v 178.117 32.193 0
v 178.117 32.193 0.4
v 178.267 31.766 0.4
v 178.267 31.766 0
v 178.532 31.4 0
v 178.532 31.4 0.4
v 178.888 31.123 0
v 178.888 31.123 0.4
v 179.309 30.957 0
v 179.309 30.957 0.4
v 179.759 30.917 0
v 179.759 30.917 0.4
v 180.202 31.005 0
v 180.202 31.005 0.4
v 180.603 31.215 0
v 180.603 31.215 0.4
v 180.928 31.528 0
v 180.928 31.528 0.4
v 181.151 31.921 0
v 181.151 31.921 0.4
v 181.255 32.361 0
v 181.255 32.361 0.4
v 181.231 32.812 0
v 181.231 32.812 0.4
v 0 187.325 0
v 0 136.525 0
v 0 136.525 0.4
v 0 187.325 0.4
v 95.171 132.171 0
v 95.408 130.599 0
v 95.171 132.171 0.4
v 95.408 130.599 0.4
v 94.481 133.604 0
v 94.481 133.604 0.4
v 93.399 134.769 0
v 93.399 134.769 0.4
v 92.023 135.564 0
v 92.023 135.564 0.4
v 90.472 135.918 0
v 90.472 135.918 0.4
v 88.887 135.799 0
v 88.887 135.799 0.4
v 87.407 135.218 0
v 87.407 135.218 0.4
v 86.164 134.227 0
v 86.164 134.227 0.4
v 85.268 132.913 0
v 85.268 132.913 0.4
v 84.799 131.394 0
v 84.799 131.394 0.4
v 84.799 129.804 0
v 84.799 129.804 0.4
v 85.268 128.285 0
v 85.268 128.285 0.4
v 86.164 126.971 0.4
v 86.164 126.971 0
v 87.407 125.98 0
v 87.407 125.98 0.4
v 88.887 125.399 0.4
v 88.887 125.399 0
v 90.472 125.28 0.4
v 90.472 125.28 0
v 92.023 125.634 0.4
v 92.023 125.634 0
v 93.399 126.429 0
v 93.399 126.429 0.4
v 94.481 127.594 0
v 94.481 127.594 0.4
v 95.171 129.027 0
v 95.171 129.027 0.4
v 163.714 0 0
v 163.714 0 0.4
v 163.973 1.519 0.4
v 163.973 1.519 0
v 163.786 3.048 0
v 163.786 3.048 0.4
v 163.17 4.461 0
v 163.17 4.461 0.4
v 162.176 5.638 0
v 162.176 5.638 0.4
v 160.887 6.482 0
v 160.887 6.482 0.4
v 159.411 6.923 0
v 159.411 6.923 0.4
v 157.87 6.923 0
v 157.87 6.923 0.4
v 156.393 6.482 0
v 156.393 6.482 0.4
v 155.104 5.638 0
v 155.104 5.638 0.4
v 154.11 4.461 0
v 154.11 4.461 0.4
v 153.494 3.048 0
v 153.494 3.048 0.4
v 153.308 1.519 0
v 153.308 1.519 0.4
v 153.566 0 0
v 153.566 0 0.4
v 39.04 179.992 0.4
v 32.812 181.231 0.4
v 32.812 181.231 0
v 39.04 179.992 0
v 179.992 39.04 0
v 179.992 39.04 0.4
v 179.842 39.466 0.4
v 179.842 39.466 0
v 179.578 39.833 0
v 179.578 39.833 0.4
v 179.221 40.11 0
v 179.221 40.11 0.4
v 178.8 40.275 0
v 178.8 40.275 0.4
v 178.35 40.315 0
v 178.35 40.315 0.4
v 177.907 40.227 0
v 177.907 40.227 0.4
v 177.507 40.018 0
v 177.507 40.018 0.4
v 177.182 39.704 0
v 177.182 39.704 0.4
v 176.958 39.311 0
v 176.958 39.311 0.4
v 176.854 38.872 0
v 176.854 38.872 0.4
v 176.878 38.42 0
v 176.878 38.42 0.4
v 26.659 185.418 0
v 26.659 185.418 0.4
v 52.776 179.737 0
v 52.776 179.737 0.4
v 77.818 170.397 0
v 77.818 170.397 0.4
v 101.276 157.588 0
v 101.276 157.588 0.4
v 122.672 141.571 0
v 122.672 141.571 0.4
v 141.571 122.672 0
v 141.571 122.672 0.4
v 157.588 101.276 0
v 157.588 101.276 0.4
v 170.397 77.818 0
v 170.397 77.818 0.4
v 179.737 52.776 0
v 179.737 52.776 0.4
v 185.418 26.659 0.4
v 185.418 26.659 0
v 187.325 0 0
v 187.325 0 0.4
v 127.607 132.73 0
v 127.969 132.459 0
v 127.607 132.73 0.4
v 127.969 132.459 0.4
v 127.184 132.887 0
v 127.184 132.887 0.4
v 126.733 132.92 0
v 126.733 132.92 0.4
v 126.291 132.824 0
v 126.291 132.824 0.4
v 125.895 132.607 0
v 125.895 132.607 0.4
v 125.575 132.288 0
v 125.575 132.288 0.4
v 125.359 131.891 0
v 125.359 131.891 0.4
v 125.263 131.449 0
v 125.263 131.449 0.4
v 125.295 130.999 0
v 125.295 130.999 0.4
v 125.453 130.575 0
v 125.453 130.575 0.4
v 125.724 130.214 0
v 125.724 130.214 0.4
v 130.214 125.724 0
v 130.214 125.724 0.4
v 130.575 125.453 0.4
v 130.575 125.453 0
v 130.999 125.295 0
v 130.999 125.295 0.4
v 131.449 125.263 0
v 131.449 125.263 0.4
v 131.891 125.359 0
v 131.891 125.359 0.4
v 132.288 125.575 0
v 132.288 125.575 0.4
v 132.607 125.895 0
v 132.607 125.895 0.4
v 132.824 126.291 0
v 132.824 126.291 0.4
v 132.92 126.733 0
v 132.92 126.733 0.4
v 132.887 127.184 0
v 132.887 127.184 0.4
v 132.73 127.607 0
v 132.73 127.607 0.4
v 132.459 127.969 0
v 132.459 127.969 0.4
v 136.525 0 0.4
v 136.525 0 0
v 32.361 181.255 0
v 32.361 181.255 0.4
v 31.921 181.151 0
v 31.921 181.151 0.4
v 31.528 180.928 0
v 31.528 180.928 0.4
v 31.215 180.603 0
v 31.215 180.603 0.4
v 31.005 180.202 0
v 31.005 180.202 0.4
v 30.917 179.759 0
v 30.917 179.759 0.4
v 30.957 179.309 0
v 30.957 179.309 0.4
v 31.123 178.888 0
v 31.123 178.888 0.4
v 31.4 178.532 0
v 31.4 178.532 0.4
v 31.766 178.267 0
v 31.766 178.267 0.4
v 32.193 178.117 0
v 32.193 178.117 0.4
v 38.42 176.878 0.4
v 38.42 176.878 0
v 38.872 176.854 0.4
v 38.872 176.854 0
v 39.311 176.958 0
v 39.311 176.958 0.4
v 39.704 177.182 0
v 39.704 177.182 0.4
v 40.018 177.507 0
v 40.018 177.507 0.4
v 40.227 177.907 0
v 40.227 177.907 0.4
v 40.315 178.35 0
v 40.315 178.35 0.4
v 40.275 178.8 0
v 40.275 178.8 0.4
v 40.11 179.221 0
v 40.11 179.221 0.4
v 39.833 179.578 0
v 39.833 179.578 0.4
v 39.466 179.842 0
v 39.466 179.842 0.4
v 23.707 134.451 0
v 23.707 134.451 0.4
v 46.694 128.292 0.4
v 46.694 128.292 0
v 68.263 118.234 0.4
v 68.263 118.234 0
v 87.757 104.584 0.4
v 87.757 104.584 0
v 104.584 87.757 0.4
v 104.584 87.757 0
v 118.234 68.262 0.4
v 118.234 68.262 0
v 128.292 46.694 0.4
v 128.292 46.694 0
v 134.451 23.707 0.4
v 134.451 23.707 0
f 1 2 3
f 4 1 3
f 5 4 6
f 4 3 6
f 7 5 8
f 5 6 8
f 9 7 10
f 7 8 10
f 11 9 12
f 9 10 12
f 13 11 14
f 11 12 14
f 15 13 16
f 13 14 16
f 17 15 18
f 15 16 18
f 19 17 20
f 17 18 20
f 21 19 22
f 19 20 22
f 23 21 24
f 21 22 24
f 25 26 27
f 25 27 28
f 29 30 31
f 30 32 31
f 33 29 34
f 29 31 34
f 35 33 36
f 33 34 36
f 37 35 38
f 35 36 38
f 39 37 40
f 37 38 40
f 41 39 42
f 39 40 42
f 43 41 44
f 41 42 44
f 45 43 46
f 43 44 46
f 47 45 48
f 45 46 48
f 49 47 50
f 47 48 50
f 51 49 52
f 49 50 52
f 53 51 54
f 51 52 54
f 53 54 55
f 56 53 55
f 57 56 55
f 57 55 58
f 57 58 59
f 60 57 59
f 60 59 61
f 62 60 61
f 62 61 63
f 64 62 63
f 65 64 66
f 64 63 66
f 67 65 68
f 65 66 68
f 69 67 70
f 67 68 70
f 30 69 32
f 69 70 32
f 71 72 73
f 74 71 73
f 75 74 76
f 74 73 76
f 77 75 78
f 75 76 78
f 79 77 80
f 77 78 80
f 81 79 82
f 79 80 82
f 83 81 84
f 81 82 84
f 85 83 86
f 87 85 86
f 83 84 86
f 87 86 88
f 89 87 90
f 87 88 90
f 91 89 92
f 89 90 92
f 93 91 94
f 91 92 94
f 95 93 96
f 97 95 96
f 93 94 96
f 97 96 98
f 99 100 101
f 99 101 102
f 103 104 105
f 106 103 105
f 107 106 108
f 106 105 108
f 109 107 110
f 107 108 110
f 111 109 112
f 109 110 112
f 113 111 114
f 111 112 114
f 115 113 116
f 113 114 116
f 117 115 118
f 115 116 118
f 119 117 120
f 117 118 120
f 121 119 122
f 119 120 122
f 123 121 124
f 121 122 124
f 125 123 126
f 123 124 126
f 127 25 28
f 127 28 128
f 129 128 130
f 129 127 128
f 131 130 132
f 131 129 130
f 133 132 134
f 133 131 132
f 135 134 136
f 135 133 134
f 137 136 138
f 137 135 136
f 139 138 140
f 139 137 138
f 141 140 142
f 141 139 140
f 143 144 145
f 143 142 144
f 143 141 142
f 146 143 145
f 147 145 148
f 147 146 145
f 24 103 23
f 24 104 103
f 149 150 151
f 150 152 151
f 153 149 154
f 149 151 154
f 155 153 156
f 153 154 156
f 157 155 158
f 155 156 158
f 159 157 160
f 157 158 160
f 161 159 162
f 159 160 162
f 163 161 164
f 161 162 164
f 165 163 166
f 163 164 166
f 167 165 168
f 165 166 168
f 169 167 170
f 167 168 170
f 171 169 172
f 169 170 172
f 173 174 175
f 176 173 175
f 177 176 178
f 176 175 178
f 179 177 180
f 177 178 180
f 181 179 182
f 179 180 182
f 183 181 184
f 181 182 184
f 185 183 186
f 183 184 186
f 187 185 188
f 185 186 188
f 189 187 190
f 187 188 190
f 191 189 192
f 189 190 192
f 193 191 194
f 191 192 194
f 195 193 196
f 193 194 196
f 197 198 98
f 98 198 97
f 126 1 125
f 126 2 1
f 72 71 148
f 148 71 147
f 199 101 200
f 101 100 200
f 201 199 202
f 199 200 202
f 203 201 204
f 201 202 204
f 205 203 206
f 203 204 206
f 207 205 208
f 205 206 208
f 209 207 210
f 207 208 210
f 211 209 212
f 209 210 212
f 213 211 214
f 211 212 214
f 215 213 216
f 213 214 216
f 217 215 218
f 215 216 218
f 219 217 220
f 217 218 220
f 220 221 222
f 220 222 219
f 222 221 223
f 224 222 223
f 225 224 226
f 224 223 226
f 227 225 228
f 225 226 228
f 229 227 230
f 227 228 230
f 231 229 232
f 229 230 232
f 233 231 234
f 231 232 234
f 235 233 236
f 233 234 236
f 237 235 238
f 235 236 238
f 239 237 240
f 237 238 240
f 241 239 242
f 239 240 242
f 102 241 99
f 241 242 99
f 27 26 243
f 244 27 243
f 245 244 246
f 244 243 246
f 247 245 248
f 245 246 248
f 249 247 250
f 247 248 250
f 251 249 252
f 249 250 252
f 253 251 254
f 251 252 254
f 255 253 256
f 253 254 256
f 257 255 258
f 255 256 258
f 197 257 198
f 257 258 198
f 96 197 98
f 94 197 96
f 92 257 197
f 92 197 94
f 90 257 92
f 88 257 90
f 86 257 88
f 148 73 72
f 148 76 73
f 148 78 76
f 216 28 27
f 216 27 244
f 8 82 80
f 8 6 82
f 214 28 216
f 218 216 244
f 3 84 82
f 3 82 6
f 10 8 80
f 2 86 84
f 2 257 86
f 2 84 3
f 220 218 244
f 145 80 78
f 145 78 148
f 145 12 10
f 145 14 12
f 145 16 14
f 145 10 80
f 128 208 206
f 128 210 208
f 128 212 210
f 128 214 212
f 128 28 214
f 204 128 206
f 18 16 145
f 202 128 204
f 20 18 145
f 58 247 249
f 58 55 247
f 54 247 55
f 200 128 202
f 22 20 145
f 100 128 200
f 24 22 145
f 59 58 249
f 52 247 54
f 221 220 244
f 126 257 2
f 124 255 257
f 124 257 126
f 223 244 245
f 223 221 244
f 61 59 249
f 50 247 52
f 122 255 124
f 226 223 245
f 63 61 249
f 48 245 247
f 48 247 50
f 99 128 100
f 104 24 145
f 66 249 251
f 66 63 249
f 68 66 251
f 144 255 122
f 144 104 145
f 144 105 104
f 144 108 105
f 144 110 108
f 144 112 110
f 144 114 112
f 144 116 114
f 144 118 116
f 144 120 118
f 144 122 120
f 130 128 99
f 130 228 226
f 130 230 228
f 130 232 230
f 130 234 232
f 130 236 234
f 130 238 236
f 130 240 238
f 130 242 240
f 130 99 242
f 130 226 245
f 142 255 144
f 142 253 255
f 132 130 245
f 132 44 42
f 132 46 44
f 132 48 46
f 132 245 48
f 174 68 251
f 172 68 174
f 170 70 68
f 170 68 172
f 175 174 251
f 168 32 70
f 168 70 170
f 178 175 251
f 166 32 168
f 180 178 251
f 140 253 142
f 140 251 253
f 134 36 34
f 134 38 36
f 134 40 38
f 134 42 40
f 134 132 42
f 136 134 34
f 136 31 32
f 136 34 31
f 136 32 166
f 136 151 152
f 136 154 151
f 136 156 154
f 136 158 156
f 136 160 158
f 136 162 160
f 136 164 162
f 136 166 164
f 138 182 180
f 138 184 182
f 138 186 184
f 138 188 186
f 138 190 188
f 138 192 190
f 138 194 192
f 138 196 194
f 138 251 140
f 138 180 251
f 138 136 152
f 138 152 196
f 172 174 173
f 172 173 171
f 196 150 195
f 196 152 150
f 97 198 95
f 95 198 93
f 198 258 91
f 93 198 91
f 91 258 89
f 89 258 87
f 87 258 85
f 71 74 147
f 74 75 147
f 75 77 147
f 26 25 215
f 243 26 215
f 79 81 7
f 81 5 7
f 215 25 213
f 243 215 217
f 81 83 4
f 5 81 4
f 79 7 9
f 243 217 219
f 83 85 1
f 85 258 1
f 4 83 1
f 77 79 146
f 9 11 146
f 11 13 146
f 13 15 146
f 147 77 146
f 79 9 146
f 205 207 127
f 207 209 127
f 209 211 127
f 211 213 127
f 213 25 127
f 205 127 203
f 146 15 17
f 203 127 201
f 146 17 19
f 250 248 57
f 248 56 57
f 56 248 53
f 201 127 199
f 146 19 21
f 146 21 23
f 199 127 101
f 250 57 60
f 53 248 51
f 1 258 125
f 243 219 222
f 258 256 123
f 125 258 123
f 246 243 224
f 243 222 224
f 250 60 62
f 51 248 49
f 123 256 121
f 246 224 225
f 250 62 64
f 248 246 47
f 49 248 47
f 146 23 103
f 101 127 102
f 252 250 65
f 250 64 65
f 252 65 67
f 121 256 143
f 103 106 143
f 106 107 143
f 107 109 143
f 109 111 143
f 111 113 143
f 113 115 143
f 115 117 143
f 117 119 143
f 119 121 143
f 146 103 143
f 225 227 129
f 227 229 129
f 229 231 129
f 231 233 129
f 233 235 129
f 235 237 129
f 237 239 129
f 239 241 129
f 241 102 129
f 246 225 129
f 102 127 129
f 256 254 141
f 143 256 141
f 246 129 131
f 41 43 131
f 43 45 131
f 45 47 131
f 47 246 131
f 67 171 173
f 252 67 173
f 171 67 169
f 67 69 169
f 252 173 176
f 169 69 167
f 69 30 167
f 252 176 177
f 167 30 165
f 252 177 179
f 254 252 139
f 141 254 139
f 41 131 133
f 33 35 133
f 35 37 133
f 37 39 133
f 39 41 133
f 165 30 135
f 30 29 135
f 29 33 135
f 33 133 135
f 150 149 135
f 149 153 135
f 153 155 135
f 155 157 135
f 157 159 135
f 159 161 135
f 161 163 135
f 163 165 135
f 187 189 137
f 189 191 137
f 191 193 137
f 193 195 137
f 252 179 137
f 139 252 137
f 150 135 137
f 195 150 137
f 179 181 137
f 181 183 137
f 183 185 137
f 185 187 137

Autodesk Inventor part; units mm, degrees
ref_plane "YZ Plane" through (0, 0, 0) normal (1, 0, 0) x (0, 1, 0)
ref_plane "XZ Plane" through (0, 0, 0) normal (0, 1, 0) x (-1, 0, 0)
ref_plane "XY Plane" through (0, 0, 0) normal (0, 0, 1) x (1, 0, 0)
sketch "Sketch1" plane through (0, 0, 0) normal (0, 0, 1) x (1, 0, 0)
  arc A0 (187.325, 0) -> (0, 187.325) centre (0, 0) ccw
  arc A1 (136.525, 0) -> (0, 136.525) centre (0, 0) ccw
  line L0 (0, 136.525) -> (0, 187.325)
  line L1 (136.525, 0) -> (187.325, 0)
  point P0 (161.925, 0)
  point P1 (0, 161.925)
  dimension "d2" = 187.325
  dimension "d3" = 136.525
extrude "Extrusion1" add sketch "Sketch1" along normal blind 0.4
sketch "Sketch3" plane through (0, 0, 0.4) normal (0, 0, 1) x (1, 0, 0)
  line L0 (179.9922, 39.0399) -> (181.231, 32.8119) projected
  arc A0 (178.117, 32.1925) -> (181.231, 32.8119) centre (179.674, 32.5022) ccw projected
  line L1 (178.117, 32.1925) -> (176.8782, 38.4205) projected
  arc A1 (179.9922, 39.0399) -> (176.8782, 38.4205) centre (178.4352, 38.7302) ccw projected
  arc A2 (130.2137, 125.7236) -> (132.4588, 127.9686) centre (131.3362, 126.8461) ccw projected
  line L2 (127.9686, 132.4588) -> (132.4588, 127.9686) projected
  arc A3 (127.9686, 132.4588) -> (125.7236, 130.2137) centre (126.8461, 131.3362) ccw projected
  line L3 (130.2137, 125.7236) -> (125.7236, 130.2137) projected
  line L4 (32.8119, 181.231) -> (39.0399, 179.9922) projected
  arc A4 (38.4205, 176.8782) -> (39.0399, 179.9922) centre (38.7302, 178.4352) ccw projected
  line L5 (38.4205, 176.8782) -> (32.1925, 178.117) projected
  arc A5 (32.8119, 181.231) -> (32.1925, 178.117) centre (32.5022, 179.674) ccw projected
  circle A6 centre (90.0738, 130.599) radius 5.334 projected
  circle A7 centre (158.6401, 1.6445) radius 5.334 projected
  point P0 (0, 0)
extrude "Extrusion2" cut sketch "Sketch3" against normal through all
properties part number "3DPRINT,CABLE,TRAY" material "ABS Plastic"
